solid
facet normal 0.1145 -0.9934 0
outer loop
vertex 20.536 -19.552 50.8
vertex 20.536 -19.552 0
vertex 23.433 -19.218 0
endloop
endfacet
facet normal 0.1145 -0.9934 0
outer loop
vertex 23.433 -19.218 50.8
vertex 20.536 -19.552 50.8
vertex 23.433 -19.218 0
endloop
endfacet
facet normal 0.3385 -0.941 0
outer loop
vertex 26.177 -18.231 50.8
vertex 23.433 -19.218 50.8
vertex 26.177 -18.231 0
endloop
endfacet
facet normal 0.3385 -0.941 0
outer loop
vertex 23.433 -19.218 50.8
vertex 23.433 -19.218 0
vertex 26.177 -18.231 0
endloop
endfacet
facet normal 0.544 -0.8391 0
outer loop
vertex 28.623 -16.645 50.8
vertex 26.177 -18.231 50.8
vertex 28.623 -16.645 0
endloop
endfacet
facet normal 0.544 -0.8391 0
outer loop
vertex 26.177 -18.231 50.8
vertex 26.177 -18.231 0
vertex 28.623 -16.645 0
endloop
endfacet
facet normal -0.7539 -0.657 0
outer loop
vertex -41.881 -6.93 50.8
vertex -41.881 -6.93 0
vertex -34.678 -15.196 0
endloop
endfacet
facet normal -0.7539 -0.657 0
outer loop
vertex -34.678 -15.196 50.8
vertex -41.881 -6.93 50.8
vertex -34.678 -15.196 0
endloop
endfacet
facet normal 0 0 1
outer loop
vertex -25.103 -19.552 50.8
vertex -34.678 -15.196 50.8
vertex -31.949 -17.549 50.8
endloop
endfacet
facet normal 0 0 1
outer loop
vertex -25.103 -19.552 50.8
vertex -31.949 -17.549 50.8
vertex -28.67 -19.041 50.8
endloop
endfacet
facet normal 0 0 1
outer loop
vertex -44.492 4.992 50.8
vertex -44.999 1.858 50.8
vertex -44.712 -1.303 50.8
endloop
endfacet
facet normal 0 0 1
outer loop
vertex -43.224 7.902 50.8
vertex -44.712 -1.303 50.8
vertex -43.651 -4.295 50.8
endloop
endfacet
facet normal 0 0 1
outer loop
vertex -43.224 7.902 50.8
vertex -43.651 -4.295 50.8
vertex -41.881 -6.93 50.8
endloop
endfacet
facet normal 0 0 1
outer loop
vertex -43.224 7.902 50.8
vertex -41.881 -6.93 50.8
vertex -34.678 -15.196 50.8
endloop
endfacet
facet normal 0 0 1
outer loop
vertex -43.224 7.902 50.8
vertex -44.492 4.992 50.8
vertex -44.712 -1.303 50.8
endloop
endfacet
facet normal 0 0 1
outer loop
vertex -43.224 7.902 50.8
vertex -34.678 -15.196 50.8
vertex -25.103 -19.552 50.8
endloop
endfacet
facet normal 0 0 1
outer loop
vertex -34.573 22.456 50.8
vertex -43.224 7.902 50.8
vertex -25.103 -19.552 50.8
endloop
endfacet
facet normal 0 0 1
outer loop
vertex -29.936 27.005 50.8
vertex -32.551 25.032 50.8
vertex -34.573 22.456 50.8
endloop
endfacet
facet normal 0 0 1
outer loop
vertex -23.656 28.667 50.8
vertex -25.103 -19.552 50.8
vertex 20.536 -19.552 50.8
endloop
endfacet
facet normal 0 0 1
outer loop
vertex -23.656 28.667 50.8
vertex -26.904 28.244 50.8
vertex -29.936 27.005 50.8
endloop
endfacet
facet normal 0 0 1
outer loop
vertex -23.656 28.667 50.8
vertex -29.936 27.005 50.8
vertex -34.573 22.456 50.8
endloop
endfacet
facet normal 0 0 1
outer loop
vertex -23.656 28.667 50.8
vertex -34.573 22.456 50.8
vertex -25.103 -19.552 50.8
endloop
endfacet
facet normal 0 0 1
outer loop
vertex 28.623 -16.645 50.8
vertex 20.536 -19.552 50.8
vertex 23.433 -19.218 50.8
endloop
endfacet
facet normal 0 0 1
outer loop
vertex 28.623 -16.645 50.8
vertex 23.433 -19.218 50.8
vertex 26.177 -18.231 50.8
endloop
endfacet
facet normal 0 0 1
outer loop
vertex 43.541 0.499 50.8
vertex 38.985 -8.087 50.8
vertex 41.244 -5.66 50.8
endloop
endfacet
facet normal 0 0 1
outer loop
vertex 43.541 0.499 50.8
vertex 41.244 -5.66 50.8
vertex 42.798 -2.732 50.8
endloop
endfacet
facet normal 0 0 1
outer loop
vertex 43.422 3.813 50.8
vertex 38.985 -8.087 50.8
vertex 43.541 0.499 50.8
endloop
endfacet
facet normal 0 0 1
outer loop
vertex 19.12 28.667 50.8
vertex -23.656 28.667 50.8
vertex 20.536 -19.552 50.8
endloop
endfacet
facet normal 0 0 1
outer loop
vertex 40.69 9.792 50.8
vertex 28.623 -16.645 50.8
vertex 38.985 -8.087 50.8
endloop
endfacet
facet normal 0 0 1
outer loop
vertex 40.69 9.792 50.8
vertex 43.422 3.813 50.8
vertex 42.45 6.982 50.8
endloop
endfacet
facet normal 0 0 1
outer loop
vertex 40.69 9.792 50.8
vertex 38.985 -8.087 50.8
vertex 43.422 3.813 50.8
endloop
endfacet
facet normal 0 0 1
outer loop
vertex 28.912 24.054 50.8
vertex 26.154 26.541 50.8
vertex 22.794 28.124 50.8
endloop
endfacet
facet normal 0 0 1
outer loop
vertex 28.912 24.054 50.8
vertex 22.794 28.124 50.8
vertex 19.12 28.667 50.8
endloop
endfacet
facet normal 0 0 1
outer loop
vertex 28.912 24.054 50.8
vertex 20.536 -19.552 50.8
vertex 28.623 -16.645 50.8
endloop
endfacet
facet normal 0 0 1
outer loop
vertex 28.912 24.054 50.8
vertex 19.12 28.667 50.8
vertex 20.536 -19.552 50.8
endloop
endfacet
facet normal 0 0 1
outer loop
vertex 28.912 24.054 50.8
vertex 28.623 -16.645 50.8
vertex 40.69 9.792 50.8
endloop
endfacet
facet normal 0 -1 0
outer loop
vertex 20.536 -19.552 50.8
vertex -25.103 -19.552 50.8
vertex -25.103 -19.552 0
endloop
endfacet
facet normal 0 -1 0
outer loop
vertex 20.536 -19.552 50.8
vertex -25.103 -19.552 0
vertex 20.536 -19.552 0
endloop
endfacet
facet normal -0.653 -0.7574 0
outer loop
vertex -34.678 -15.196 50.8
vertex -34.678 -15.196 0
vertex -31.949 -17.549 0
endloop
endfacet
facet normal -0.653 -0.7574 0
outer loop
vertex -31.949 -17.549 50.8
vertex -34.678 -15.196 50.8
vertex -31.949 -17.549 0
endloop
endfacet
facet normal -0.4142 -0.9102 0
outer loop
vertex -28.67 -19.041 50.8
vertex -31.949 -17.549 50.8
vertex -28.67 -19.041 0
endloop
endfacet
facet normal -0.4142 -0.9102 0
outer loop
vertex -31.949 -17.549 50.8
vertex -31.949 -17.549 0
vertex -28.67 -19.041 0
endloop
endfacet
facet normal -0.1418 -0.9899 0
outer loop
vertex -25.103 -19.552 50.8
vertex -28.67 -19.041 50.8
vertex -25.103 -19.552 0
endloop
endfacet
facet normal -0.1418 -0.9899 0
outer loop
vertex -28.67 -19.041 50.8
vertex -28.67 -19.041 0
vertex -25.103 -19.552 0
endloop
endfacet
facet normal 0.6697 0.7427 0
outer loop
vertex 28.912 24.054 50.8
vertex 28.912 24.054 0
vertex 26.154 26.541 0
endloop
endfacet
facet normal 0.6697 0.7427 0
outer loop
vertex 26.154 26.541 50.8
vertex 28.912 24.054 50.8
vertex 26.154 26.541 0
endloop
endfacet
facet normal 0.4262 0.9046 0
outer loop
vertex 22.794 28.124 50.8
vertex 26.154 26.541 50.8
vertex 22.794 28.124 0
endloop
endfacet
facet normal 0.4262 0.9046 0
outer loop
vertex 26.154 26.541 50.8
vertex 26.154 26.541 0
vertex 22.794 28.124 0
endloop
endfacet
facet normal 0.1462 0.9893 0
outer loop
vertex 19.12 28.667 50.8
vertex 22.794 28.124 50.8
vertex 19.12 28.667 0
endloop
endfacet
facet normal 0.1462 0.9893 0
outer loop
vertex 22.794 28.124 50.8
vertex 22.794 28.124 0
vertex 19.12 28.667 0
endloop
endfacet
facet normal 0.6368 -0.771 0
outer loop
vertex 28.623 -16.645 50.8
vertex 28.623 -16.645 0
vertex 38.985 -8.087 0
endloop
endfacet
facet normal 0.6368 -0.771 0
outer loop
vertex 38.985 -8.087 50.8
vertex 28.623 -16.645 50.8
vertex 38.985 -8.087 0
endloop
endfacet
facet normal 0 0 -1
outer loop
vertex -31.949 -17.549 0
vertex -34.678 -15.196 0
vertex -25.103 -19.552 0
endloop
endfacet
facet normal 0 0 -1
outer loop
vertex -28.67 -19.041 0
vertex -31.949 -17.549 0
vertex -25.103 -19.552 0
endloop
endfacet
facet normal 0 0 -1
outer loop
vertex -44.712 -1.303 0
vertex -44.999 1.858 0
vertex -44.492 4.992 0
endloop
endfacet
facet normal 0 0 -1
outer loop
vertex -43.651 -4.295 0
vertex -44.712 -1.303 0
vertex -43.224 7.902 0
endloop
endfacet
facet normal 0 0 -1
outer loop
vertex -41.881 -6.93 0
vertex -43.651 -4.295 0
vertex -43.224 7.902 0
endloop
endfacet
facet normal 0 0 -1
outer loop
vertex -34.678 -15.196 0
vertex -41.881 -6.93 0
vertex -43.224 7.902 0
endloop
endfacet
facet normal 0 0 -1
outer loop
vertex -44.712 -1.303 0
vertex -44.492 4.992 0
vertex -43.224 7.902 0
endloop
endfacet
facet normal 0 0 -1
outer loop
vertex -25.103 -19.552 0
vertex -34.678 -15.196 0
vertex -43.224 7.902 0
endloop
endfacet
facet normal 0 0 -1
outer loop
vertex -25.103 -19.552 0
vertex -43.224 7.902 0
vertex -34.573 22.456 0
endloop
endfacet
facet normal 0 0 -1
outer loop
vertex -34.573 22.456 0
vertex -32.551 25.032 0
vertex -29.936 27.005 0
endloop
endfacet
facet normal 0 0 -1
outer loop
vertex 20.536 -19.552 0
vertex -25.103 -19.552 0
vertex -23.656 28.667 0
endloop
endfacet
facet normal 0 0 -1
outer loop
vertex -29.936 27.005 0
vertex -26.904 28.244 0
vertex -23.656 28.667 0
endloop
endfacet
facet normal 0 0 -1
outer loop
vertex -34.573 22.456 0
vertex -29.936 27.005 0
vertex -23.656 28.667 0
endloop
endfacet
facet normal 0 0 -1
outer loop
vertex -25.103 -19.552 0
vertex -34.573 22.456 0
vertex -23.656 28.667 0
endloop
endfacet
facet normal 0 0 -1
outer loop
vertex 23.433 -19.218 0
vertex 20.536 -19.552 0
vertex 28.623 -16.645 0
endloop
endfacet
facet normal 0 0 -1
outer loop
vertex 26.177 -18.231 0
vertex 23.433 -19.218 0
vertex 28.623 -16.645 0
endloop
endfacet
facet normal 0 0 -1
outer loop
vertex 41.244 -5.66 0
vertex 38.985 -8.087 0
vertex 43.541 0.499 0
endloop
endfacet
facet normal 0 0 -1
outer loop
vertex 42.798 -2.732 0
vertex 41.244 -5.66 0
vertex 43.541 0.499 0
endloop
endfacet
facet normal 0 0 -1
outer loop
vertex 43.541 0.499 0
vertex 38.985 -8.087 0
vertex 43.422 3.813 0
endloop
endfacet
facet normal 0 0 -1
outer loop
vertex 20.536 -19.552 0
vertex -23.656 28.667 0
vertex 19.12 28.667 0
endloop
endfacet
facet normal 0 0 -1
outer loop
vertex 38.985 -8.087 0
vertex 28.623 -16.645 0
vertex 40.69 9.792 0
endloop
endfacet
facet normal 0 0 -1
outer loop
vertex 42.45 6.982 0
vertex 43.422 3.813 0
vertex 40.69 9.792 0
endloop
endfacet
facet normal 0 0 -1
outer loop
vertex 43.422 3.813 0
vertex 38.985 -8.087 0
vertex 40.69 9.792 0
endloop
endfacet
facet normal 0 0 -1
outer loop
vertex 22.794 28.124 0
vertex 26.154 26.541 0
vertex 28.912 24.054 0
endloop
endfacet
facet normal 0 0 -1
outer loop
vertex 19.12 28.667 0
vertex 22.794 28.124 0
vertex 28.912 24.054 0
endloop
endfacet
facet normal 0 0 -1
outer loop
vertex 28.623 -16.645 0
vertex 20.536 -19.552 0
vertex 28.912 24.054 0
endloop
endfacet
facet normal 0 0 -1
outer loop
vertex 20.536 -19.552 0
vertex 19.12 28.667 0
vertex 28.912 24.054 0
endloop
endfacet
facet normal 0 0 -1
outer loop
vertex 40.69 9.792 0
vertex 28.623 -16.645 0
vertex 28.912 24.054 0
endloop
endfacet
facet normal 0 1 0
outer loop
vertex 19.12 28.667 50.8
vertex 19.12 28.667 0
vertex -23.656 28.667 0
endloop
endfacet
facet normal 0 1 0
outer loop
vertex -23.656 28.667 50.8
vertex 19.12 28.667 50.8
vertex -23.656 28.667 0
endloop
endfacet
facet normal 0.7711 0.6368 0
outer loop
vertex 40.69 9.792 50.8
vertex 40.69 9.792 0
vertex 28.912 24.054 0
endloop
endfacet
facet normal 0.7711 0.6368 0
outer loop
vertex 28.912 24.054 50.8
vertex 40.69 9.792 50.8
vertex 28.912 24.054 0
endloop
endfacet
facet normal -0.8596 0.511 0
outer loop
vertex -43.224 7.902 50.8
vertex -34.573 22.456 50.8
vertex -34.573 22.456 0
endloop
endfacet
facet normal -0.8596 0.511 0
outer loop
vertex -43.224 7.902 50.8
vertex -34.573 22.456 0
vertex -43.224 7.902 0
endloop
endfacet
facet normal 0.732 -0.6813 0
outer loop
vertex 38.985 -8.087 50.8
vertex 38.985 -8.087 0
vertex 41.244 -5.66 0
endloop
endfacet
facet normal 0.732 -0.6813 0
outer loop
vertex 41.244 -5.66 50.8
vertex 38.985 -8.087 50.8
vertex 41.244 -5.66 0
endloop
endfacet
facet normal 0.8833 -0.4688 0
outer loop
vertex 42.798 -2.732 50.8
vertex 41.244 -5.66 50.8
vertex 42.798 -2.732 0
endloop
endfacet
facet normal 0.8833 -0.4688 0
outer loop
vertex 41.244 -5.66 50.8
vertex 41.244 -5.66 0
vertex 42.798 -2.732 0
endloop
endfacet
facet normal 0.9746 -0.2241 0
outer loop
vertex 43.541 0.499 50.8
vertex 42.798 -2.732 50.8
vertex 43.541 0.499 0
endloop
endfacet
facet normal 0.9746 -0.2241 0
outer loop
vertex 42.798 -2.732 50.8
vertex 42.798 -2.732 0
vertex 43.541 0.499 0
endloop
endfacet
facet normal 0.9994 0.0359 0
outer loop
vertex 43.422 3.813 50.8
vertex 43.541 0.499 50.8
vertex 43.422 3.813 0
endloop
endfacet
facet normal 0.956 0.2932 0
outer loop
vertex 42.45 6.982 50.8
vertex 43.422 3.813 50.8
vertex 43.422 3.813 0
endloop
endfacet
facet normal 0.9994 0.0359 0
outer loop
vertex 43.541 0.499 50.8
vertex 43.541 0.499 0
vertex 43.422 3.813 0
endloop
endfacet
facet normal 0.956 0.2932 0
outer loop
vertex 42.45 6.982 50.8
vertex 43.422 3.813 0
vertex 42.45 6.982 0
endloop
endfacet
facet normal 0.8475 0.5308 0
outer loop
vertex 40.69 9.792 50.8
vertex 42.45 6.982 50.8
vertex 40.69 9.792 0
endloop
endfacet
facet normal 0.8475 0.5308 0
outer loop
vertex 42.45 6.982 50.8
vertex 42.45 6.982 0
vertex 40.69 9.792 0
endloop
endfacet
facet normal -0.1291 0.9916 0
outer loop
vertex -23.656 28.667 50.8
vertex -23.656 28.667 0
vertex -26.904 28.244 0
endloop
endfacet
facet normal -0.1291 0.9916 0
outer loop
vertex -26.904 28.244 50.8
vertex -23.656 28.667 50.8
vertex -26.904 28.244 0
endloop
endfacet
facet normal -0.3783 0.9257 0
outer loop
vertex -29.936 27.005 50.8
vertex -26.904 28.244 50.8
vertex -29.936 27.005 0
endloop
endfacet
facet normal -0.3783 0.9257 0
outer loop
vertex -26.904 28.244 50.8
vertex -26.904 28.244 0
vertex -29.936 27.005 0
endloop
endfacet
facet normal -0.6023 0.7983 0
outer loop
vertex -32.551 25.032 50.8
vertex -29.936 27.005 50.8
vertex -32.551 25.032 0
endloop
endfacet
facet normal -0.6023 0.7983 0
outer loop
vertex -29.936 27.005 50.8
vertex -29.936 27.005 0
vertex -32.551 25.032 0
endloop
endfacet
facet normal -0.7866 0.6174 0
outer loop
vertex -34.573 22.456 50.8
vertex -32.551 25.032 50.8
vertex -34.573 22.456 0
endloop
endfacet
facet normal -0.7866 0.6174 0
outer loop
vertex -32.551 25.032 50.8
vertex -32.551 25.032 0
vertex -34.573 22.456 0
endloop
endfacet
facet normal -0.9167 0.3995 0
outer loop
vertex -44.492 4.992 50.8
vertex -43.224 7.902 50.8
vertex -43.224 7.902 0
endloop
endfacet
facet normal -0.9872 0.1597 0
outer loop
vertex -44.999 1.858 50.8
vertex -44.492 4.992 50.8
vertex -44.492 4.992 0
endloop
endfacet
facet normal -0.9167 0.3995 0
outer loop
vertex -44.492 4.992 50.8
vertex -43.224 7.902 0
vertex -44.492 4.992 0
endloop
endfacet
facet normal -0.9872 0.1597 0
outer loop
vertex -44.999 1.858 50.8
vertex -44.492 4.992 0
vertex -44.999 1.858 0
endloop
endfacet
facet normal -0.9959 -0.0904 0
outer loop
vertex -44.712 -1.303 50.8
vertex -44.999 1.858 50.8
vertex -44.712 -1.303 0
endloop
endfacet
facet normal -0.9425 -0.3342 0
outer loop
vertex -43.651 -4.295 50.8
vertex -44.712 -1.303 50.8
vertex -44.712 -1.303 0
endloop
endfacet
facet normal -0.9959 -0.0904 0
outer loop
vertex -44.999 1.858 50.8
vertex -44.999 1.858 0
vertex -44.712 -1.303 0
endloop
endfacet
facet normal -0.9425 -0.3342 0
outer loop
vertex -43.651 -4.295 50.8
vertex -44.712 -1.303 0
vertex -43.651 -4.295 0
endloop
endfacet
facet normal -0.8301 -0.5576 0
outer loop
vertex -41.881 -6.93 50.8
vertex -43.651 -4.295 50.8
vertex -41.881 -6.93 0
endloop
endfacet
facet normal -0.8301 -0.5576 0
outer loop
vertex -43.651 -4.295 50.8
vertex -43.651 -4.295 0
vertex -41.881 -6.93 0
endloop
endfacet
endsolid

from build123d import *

# Parameters (mm, degrees)
F1_DEPTH = 50.8


with BuildPart() as f1:
    # F0 (on Top) → F1 (new body)
    with BuildSketch(Plane.XY):
        with BuildLine():
            Line((-34.573272, 22.455608), (-43.223512, 7.902216))
            ThreePointArc((-43.223512, 7.902216), (-44.954669, 0.268443), (-41.880949, -6.93042))
            Line((-41.880949, -6.93042), (-34.677799, -15.196177))
            ThreePointArc((-34.677799, -15.196177), (-30.362733, -18.412203), (-25.103225, -19.552464))
            Line((-25.103225, -19.552464), (20.536096, -19.552464))
            ThreePointArc((20.536096, -19.552464), (24.833093, -18.80344), (28.623231, -16.644718))
            Line((28.623231, -16.644718), (38.985124, -8.087135))
            ThreePointArc((38.985124, -8.087135), (43.540626, 0.499418), (40.690243, 9.792254))
            Line((40.690243, 9.792254), (28.912036, 24.05382))
            ThreePointArc((28.912036, 24.05382), (24.531961, 27.455736), (19.119781, 28.666684))
            Line((19.119781, 28.666684), (-23.656136, 28.666684))
            ThreePointArc((-23.656136, 28.666684), (-29.93629, 27.005238), (-34.573272, 22.455608))
        make_face()
    extrude(amount=F1_DEPTH)


solid = f1.part
